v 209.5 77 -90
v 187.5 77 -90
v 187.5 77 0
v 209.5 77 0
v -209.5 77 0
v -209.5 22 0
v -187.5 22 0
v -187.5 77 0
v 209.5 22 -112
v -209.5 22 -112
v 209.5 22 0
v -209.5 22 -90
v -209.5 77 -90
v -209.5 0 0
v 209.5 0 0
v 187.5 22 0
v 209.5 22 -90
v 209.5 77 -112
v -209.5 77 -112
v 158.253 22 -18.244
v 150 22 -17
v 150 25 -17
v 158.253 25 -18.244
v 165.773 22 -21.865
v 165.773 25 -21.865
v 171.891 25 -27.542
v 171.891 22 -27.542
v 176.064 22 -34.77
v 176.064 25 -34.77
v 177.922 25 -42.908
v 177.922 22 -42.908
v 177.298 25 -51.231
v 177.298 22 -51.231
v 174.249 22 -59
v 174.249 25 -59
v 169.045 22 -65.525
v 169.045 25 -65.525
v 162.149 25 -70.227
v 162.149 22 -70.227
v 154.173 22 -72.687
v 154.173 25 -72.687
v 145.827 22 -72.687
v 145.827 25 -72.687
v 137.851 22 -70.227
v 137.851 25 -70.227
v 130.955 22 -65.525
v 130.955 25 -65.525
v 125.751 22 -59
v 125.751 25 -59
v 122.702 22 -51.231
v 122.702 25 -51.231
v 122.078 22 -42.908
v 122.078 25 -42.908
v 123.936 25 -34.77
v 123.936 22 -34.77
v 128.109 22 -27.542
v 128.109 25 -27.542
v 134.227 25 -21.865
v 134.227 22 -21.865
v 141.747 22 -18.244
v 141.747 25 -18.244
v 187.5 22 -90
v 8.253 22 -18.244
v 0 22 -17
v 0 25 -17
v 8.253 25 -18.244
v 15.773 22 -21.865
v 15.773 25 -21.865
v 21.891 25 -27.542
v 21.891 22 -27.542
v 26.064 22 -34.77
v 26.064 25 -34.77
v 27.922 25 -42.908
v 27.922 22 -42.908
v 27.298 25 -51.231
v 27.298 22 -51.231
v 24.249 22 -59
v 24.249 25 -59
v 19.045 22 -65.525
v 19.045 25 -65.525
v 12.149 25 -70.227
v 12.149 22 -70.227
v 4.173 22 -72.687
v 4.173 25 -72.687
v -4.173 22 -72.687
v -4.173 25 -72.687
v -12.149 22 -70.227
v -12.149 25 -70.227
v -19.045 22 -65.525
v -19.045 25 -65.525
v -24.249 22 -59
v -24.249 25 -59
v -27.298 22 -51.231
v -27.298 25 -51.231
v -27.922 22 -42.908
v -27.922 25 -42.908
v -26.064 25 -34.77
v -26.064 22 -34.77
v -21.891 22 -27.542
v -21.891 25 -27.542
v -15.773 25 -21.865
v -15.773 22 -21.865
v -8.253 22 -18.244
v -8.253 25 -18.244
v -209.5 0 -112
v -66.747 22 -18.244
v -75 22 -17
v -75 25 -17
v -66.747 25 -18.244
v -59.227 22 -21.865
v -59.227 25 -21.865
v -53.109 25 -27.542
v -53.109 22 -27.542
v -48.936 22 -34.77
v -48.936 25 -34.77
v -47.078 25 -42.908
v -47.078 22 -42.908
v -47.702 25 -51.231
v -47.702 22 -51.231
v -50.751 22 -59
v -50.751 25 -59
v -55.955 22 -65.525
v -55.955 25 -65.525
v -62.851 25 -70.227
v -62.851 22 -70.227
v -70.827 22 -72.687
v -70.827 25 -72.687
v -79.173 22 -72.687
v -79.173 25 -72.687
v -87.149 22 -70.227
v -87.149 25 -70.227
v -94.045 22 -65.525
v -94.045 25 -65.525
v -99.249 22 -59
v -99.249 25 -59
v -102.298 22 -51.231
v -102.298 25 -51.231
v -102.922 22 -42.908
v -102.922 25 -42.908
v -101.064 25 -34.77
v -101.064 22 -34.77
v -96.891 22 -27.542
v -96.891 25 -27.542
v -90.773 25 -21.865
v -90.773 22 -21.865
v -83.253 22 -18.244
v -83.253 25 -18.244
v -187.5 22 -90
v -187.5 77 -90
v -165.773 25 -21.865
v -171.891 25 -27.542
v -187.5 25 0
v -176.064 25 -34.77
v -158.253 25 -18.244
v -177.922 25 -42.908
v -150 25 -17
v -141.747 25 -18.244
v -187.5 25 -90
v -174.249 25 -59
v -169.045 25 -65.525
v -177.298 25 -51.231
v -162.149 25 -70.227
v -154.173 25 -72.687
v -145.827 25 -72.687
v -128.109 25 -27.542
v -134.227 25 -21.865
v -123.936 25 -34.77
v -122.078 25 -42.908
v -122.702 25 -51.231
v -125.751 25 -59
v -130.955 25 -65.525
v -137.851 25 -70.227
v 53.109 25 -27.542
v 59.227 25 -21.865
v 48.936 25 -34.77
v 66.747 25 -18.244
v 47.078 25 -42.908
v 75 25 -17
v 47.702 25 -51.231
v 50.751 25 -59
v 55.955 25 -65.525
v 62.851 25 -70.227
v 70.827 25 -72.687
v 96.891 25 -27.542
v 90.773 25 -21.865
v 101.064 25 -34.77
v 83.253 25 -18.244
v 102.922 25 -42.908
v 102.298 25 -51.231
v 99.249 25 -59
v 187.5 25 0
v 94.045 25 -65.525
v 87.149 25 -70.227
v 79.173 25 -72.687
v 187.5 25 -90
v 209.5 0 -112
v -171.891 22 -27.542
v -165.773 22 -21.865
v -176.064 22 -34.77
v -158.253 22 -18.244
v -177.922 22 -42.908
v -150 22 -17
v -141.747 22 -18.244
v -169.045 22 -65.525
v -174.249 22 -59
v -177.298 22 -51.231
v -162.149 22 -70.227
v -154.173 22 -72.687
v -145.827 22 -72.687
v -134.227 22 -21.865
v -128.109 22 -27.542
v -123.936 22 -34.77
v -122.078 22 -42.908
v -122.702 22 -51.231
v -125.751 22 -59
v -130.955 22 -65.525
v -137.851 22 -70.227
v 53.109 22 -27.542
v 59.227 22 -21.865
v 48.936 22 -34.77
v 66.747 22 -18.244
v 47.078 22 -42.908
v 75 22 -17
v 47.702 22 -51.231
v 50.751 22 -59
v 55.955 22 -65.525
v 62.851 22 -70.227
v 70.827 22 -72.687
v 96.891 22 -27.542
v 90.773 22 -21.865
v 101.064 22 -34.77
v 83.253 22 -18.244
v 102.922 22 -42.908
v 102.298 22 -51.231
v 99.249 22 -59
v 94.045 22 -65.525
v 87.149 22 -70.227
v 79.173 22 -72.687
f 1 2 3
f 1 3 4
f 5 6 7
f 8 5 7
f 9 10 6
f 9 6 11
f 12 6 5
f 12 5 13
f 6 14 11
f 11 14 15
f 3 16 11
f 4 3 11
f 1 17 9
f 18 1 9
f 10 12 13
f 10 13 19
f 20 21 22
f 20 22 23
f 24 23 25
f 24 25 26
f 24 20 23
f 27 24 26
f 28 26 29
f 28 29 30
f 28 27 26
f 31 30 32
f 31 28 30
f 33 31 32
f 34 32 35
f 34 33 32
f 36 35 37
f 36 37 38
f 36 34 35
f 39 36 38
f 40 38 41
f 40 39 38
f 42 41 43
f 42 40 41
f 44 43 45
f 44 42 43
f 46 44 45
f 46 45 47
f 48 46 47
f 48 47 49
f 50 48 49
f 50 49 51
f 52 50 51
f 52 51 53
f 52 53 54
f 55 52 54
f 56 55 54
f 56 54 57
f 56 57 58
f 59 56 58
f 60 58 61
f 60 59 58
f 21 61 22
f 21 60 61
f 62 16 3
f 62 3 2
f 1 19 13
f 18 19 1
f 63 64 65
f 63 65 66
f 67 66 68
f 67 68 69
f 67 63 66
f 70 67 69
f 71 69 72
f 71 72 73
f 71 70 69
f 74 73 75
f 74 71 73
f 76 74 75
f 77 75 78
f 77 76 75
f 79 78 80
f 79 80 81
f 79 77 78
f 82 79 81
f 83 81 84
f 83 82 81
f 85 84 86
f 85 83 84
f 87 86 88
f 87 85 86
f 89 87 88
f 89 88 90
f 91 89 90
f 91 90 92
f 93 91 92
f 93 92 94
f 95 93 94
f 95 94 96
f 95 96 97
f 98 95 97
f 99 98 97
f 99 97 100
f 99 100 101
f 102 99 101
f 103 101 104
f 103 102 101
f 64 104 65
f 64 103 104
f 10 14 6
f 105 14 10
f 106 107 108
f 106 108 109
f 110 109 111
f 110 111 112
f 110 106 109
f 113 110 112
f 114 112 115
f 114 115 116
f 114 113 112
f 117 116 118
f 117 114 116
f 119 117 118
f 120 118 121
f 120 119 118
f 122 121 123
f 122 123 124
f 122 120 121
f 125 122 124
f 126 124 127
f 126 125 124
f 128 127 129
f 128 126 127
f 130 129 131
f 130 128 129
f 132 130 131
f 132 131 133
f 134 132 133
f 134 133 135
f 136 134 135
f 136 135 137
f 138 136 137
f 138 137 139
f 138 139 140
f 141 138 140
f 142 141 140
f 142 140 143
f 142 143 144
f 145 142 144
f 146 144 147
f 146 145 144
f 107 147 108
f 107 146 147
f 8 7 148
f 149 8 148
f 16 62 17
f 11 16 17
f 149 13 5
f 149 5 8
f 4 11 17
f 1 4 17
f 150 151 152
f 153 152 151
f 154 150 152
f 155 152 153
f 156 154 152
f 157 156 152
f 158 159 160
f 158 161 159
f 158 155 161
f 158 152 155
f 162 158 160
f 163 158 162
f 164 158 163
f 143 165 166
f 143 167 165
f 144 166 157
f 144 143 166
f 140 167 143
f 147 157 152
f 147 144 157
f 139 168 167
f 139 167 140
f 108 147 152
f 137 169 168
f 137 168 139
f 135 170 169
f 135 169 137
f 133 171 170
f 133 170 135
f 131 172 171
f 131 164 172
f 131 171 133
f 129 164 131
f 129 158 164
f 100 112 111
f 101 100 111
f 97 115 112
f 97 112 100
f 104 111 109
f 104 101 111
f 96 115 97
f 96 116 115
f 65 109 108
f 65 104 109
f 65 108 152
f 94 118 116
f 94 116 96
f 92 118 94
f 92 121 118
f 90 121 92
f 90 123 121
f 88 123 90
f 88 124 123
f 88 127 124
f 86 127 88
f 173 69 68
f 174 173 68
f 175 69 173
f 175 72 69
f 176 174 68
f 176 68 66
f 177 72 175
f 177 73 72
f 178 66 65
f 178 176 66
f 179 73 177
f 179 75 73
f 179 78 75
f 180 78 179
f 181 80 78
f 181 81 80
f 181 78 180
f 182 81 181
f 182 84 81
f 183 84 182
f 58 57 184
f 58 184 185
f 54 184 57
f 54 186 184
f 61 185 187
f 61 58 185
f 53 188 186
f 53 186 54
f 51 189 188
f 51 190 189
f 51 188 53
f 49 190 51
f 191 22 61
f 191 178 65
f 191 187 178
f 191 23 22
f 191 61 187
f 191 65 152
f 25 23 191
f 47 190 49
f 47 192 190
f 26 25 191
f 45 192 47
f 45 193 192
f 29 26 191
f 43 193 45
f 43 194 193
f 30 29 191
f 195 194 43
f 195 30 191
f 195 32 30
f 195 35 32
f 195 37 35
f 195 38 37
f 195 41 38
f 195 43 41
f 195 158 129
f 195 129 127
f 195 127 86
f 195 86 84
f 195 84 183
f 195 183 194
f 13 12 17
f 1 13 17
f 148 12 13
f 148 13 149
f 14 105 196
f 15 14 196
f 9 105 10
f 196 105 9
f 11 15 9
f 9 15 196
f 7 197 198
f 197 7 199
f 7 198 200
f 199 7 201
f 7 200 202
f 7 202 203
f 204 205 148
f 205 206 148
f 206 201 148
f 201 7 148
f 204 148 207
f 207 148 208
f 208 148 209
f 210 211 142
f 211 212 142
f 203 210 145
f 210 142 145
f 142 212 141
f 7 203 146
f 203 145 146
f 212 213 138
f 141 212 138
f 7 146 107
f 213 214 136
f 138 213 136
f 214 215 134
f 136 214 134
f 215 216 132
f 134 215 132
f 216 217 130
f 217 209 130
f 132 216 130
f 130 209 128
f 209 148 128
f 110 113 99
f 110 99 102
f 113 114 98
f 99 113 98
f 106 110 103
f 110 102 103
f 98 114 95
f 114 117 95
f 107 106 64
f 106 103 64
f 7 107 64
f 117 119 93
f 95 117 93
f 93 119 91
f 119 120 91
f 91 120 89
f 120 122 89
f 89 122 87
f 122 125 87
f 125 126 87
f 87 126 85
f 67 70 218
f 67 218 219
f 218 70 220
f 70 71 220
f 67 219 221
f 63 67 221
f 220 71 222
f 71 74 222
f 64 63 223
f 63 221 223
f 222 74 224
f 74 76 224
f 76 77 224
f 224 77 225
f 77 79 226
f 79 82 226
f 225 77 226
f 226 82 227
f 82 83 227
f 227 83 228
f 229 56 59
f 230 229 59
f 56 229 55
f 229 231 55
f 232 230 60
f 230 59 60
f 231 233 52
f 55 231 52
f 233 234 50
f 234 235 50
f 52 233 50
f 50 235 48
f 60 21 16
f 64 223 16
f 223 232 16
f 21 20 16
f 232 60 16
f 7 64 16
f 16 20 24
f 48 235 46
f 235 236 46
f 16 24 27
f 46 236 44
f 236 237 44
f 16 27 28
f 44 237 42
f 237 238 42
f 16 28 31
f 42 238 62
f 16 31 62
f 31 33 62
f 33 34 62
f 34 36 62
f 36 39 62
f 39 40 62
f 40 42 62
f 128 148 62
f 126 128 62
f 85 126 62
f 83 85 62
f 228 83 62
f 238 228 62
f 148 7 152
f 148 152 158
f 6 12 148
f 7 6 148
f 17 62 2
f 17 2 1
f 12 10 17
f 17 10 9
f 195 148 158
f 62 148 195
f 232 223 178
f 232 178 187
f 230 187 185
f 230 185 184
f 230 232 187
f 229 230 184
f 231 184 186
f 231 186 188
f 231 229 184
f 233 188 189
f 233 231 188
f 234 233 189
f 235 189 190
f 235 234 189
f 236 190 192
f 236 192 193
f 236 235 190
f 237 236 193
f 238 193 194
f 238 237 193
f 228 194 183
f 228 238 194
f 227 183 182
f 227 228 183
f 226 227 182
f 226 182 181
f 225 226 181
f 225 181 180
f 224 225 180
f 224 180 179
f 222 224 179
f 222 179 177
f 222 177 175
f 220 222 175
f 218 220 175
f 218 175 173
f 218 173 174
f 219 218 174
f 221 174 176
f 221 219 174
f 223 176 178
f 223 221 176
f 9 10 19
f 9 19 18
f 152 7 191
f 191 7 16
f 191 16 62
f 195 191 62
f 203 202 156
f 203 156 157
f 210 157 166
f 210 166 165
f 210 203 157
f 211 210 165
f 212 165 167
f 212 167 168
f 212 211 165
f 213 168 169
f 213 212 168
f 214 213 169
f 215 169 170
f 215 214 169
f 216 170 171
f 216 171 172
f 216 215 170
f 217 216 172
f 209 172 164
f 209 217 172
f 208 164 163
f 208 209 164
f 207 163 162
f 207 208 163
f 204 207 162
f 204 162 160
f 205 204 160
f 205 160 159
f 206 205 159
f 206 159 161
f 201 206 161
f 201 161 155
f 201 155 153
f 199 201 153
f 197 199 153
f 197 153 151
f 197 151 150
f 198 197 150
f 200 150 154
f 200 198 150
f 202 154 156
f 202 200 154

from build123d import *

# Parameters (mm, degrees)
ESQUISSE1_W          = 419
ESQUISSE1_H          = 112
BOSS_EXTRU_1_DEPTH   = 22
ESQUISSE2_W          = 419
ESQUISSE2_H          = 22
BOSS_EXTRU_2_DEPTH   = 55
ESQUISSE3_W          = 22
ESQUISSE3_H          = 90
BOSS_EXTRU_3_DEPTH   = 55
BOSS_EXTRU_3_2_DEPTH = 55
ESQUISSE4_W          = 375
ESQUISSE4_H          = 90
ESQUISSE4_R          = 28
BOSS_EXTRU_4_DEPTH   = 3


with BuildPart() as part:
    # Esquisse1 → Boss.-Extru.1 (new body)
    with BuildSketch(Plane(origin=(0, 0, 0), x_dir=(1, 0, 0), z_dir=(0, 1, 0))):
        with Locations((0, 56)):
            Rectangle(ESQUISSE1_W, ESQUISSE1_H)
    extrude(amount=BOSS_EXTRU_1_DEPTH)


with BuildPart() as body_2:
    # Esquisse2 → Boss.-Extru.2 (new body)
    with BuildSketch(Plane(origin=(0, 22, 0), x_dir=(1, 0, 0), z_dir=(0, 1, 0))):
        with Locations((0, 101)):
            Rectangle(ESQUISSE2_W, ESQUISSE2_H)
    extrude(amount=BOSS_EXTRU_2_DEPTH)


with BuildPart() as body_3:
    # Esquisse3 → Boss.-Extru.3 (new body)
    with BuildSketch(Plane(origin=(0, 22, 0), x_dir=(1, 0, 0), z_dir=(0, 1, 0))):
        with Locations((-198.5, 45)):
            Rectangle(ESQUISSE3_W, ESQUISSE3_H)
    extrude(amount=BOSS_EXTRU_3_DEPTH)


with BuildPart() as body_4:
    # Esquisse3 → Boss.-Extru.3 2 (new body)
    with BuildSketch(Plane(origin=(0, 22, 0), x_dir=(1, 0, 0), z_dir=(0, 1, 0))):
        with Locations((198.5, 45)):
            Rectangle(ESQUISSE3_W, ESQUISSE3_H)
    extrude(amount=BOSS_EXTRU_3_2_DEPTH)


with BuildPart() as body_5:
    # Esquisse4 → Boss.-Extru.4 (new body)
    with BuildSketch(Plane(origin=(0, 22, 0), x_dir=(1, 0, 0), z_dir=(0, 1, 0))):
        with Locations((0, 45)):
            Rectangle(ESQUISSE4_W, ESQUISSE4_H)
        with Locations(Location((-150, 45, 0), (0, 0, 270))):
            Circle(ESQUISSE4_R, mode=Mode.SUBTRACT)
        with Locations(Location((-75, 45, 0), (0, 0, 270))):
            Circle(ESQUISSE4_R, mode=Mode.SUBTRACT)
        with Locations(Location((0, 45, 0), (0, 0, 270))):
            Circle(ESQUISSE4_R, mode=Mode.SUBTRACT)
        with Locations(Location((75, 45, 0), (0, 0, 270))):
            Circle(ESQUISSE4_R, mode=Mode.SUBTRACT)
        with Locations(Location((150, 45, 0), (0, 0, 270))):
            Circle(ESQUISSE4_R, mode=Mode.SUBTRACT)
    extrude(amount=BOSS_EXTRU_4_DEPTH)


solid = Compound([part.part, body_2.part, body_3.part, body_4.part, body_5.part])
